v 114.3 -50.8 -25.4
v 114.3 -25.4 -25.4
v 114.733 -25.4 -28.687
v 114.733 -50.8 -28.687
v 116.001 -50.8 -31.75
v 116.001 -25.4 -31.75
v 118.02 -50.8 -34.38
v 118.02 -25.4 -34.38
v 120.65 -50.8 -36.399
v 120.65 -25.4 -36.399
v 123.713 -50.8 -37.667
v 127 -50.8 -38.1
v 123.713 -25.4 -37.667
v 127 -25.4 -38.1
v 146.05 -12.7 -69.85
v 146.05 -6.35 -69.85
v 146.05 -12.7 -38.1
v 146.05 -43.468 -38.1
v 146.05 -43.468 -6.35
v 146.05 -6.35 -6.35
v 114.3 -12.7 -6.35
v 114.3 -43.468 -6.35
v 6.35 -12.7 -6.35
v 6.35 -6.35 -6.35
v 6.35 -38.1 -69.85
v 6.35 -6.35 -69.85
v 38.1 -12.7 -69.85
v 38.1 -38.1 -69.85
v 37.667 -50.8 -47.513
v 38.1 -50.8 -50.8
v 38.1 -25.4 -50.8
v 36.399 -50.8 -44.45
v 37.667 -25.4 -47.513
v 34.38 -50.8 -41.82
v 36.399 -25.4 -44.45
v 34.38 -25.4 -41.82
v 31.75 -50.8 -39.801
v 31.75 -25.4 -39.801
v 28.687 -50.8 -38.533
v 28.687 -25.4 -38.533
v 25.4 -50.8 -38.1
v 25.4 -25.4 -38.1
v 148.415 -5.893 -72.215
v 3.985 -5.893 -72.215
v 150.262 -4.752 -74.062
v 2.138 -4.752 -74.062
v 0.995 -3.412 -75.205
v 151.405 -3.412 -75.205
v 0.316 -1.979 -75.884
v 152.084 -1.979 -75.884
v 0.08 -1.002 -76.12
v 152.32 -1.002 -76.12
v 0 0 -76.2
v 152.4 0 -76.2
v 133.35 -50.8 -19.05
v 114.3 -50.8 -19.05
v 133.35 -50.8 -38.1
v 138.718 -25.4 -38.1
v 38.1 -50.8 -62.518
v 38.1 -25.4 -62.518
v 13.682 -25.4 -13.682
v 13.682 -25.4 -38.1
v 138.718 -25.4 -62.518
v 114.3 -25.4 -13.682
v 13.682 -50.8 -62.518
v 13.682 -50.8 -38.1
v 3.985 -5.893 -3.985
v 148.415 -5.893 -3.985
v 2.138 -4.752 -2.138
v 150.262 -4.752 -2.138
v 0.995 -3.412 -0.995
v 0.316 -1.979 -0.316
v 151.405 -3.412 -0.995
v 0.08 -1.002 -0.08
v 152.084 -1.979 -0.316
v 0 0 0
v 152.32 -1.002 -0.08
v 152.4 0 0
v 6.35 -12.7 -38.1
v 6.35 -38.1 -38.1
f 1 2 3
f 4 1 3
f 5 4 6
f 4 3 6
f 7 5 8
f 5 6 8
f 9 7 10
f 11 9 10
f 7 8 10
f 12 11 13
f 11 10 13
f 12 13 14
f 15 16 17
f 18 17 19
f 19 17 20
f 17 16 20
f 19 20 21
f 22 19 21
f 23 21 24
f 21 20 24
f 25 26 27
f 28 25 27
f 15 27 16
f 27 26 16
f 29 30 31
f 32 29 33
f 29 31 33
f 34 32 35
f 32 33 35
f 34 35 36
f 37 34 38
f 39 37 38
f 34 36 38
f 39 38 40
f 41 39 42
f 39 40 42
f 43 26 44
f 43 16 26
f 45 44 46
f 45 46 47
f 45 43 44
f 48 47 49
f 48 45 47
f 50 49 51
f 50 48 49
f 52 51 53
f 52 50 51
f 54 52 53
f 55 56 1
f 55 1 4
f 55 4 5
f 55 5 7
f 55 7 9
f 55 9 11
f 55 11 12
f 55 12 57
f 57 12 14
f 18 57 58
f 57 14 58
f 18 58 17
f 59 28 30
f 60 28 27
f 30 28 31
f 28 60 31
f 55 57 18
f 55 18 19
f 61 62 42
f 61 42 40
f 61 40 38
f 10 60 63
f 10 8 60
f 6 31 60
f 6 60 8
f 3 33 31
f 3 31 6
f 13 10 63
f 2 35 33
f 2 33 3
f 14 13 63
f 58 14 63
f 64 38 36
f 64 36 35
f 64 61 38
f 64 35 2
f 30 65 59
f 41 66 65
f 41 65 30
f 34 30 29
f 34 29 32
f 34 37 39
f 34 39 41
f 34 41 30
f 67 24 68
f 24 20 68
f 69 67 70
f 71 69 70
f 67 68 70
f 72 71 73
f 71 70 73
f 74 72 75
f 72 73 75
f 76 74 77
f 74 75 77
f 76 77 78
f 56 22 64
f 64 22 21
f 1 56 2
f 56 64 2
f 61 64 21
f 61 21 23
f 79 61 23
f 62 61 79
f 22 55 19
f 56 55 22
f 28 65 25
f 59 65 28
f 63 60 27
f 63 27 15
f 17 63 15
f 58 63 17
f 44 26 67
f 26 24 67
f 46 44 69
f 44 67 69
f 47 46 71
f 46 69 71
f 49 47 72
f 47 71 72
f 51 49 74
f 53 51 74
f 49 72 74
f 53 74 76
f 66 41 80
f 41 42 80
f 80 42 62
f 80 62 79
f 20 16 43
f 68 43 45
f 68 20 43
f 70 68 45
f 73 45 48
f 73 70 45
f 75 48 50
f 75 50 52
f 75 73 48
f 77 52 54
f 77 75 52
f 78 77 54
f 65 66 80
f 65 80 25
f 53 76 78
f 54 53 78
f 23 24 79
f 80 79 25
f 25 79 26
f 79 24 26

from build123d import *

# Parameters (mm, degrees)
F1_DEPTH    = 25.4
F0_W        = 152.4
F0_H        = 76.2
F2_DEPTH    = 6.35
F3_DEPTH    = 50.8
F4_R        = 6.34999
F5_C1_SIZE2 = 7.3323484187
F5_C1_SIZE  = 12.7
F5_C2_SIZE2 = 7.3323484187
F5_C2_SIZE  = 12.7
F5_C3_SIZE2 = 12.7
F5_C3_SIZE  = 7.3323484187
F5_C4_SIZE2 = 7.3323484187
F5_C4_SIZE  = 12.7
F5_C5_SIZE2 = 7.3323484187
F5_C5_SIZE  = 12.7
F5_C6_SIZE2 = 12.7
F5_C6_SIZE  = 7.3323484187
F5_C7_SIZE2 = 7.3323484187
F5_C7_SIZE  = 12.7
F5_C8_SIZE2 = 7.3323484187
F5_C8_SIZE  = 12.7


# Not quite as in the source:
# - a fillet or chamfer is up to 0.001 mm smaller than in the source, because OpenCascade refuses the exact size


with BuildPart() as f1:
    # F0 (on Front) → F1 (new body)
    with BuildSketch(Plane.XZ):
        with BuildLine():
            Line((114.3, -6.35), (6.35, -6.35))
            Line((6.35, -6.35), (6.35, -38.1))
            Line((6.35, -38.1), (25.4, -38.1))
            ThreePointArc((25.4, -38.1), (34.3802561211, -41.8197438789), (38.1, -50.8))
            Line((38.1, -50.8), (38.1, -69.85))
            Line((38.1, -69.85), (146.05, -69.85))
            Line((146.05, -69.85), (146.05, -38.1))
            Line((146.05, -38.1), (127, -38.1))
            ThreePointArc((127, -38.1), (118.0197438789, -34.3802561211), (114.3, -25.4))
            Line((114.3, -25.4), (114.3, -6.35))
        make_face()
    extrude(amount=F1_DEPTH)

    # F0 (on Front) → F2 (join)
    with BuildSketch(Plane.XZ):
        with Locations((76.2, -38.1)):
            Rectangle(F0_W, F0_H)
        Polygon((6.35, -38.1), (6.35, -6.35), (114.3, -6.35), (146.05, -6.35), (146.05, -38.1), (146.05, -69.85), (38.1, -69.85), (6.35, -69.85), align=None, mode=Mode.SUBTRACT)
    extrude(amount=F2_DEPTH)

    # F0 (on Front) → F3 (join)
    with BuildSketch(Plane.XZ):
        with BuildLine():
            Line((25.4, -38.1), (6.35, -38.1))
            Line((6.35, -38.1), (6.35, -69.85))
            Line((6.35, -69.85), (38.1, -69.85))
            Line((38.1, -69.85), (38.1, -50.8))
            ThreePointArc((38.1, -50.8), (34.3802561211, -41.8197438789), (25.4, -38.1))
        make_face()
        with BuildLine():
            Line((146.05, -6.35), (114.3, -6.35))
            Line((114.3, -6.35), (114.3, -25.4))
            ThreePointArc((114.3, -25.4), (118.0197438789, -34.3802561211), (127, -38.1))
            Line((127, -38.1), (146.05, -38.1))
            Line((146.05, -38.1), (146.05, -6.35))
        make_face()
    extrude(amount=F3_DEPTH)

    # F4 (radius 6.35 in the source; OpenCascade refuses exactly that, so slightly less here)
    f4_edges = [f1.edges().sort_by_distance(p)[0] for p in [
        (76.2, -6.35, -76.2),
        (0, -6.35, -38.1),
        (152.4, -6.35, -38.1),
        (76.2, -6.35, 0),
    ]]
    fillet(f4_edges, radius=F4_R)

    # F5: chamfer of 12.7 x 7.3323484187 on 8 edges, made by hand

    # F5_c1
    f5_c1_edges = [f1.edges().sort_by_distance(p)[0] for p in [
        (6.35, -25.4, -22.225),
    ]]
    f5_c1_side = f1.faces().sort_by_distance((6.35, -25.2533530316, -22.225))[0]
    chamfer(f5_c1_edges, length=F5_C1_SIZE, length2=F5_C1_SIZE2, reference=f5_c1_side)

    # F5_c2
    f5_c2_edges = [f1.edges().sort_by_distance(p)[0] for p in [
        (6.35, -50.8, -53.975),
    ]]
    f5_c2_side = f1.faces().sort_by_distance((6.35, -50.6533530316, -53.975))[0]
    chamfer(f5_c2_edges, length=F5_C2_SIZE, length2=F5_C2_SIZE2, reference=f5_c2_side)

    # F5_c3
    f5_c3_edges = [f1.edges().sort_by_distance(p)[0] for p in [
        (130.175, -50.8, -6.35),
    ]]
    f5_c3_side = f1.faces().sort_by_distance((130.175, -50.6533530316, -6.35))[0]
    chamfer(f5_c3_edges, length=F5_C3_SIZE, length2=F5_C3_SIZE2, reference=f5_c3_side)

    # F5_c4
    f5_c4_edges = [f1.edges().sort_by_distance(p)[0] for p in [
        (63.9911742094, -25.4, -6.35),
    ]]
    f5_c4_side = f1.faces().sort_by_distance((63.9911742094, -25.2533530316, -6.35))[0]
    chamfer(f5_c4_edges, length=F5_C4_SIZE, length2=F5_C4_SIZE2, reference=f5_c4_side)

    # F5_c5
    f5_c5_edges = [f1.edges().sort_by_distance(p)[0] for p in [
        (146.05, -25.4, -53.975),
    ]]
    f5_c5_side = f1.faces().sort_by_distance((146.05, -25.2533530316, -53.975))[0]
    chamfer(f5_c5_edges, length=F5_C5_SIZE, length2=F5_C5_SIZE2, reference=f5_c5_side)

    # F5_c6
    f5_c6_edges = [f1.edges().sort_by_distance(p)[0] for p in [
        (146.05, -50.8, -28.575),
    ]]
    f5_c6_side = f1.faces().sort_by_distance((146.05, -50.6533530316, -28.575))[0]
    chamfer(f5_c6_edges, length=F5_C6_SIZE, length2=F5_C6_SIZE2, reference=f5_c6_side)

    # F5_c7
    f5_c7_edges = [f1.edges().sort_by_distance(p)[0] for p in [
        (25.8911742094, -50.8, -69.85),
    ]]
    f5_c7_side = f1.faces().sort_by_distance((25.8911742094, -50.6533530316, -69.85))[0]
    chamfer(f5_c7_edges, length=F5_C7_SIZE, length2=F5_C7_SIZE2, reference=f5_c7_side)

    # F5_c8
    f5_c8_edges = [f1.edges().sort_by_distance(p)[0] for p in [
        (88.4088257906, -25.4, -69.85),
    ]]
    f5_c8_side = f1.faces().sort_by_distance((88.4088257906, -25.2533530316, -69.85))[0]
    chamfer(f5_c8_edges, length=F5_C8_SIZE, length2=F5_C8_SIZE2, reference=f5_c8_side)


solid = f1.part
